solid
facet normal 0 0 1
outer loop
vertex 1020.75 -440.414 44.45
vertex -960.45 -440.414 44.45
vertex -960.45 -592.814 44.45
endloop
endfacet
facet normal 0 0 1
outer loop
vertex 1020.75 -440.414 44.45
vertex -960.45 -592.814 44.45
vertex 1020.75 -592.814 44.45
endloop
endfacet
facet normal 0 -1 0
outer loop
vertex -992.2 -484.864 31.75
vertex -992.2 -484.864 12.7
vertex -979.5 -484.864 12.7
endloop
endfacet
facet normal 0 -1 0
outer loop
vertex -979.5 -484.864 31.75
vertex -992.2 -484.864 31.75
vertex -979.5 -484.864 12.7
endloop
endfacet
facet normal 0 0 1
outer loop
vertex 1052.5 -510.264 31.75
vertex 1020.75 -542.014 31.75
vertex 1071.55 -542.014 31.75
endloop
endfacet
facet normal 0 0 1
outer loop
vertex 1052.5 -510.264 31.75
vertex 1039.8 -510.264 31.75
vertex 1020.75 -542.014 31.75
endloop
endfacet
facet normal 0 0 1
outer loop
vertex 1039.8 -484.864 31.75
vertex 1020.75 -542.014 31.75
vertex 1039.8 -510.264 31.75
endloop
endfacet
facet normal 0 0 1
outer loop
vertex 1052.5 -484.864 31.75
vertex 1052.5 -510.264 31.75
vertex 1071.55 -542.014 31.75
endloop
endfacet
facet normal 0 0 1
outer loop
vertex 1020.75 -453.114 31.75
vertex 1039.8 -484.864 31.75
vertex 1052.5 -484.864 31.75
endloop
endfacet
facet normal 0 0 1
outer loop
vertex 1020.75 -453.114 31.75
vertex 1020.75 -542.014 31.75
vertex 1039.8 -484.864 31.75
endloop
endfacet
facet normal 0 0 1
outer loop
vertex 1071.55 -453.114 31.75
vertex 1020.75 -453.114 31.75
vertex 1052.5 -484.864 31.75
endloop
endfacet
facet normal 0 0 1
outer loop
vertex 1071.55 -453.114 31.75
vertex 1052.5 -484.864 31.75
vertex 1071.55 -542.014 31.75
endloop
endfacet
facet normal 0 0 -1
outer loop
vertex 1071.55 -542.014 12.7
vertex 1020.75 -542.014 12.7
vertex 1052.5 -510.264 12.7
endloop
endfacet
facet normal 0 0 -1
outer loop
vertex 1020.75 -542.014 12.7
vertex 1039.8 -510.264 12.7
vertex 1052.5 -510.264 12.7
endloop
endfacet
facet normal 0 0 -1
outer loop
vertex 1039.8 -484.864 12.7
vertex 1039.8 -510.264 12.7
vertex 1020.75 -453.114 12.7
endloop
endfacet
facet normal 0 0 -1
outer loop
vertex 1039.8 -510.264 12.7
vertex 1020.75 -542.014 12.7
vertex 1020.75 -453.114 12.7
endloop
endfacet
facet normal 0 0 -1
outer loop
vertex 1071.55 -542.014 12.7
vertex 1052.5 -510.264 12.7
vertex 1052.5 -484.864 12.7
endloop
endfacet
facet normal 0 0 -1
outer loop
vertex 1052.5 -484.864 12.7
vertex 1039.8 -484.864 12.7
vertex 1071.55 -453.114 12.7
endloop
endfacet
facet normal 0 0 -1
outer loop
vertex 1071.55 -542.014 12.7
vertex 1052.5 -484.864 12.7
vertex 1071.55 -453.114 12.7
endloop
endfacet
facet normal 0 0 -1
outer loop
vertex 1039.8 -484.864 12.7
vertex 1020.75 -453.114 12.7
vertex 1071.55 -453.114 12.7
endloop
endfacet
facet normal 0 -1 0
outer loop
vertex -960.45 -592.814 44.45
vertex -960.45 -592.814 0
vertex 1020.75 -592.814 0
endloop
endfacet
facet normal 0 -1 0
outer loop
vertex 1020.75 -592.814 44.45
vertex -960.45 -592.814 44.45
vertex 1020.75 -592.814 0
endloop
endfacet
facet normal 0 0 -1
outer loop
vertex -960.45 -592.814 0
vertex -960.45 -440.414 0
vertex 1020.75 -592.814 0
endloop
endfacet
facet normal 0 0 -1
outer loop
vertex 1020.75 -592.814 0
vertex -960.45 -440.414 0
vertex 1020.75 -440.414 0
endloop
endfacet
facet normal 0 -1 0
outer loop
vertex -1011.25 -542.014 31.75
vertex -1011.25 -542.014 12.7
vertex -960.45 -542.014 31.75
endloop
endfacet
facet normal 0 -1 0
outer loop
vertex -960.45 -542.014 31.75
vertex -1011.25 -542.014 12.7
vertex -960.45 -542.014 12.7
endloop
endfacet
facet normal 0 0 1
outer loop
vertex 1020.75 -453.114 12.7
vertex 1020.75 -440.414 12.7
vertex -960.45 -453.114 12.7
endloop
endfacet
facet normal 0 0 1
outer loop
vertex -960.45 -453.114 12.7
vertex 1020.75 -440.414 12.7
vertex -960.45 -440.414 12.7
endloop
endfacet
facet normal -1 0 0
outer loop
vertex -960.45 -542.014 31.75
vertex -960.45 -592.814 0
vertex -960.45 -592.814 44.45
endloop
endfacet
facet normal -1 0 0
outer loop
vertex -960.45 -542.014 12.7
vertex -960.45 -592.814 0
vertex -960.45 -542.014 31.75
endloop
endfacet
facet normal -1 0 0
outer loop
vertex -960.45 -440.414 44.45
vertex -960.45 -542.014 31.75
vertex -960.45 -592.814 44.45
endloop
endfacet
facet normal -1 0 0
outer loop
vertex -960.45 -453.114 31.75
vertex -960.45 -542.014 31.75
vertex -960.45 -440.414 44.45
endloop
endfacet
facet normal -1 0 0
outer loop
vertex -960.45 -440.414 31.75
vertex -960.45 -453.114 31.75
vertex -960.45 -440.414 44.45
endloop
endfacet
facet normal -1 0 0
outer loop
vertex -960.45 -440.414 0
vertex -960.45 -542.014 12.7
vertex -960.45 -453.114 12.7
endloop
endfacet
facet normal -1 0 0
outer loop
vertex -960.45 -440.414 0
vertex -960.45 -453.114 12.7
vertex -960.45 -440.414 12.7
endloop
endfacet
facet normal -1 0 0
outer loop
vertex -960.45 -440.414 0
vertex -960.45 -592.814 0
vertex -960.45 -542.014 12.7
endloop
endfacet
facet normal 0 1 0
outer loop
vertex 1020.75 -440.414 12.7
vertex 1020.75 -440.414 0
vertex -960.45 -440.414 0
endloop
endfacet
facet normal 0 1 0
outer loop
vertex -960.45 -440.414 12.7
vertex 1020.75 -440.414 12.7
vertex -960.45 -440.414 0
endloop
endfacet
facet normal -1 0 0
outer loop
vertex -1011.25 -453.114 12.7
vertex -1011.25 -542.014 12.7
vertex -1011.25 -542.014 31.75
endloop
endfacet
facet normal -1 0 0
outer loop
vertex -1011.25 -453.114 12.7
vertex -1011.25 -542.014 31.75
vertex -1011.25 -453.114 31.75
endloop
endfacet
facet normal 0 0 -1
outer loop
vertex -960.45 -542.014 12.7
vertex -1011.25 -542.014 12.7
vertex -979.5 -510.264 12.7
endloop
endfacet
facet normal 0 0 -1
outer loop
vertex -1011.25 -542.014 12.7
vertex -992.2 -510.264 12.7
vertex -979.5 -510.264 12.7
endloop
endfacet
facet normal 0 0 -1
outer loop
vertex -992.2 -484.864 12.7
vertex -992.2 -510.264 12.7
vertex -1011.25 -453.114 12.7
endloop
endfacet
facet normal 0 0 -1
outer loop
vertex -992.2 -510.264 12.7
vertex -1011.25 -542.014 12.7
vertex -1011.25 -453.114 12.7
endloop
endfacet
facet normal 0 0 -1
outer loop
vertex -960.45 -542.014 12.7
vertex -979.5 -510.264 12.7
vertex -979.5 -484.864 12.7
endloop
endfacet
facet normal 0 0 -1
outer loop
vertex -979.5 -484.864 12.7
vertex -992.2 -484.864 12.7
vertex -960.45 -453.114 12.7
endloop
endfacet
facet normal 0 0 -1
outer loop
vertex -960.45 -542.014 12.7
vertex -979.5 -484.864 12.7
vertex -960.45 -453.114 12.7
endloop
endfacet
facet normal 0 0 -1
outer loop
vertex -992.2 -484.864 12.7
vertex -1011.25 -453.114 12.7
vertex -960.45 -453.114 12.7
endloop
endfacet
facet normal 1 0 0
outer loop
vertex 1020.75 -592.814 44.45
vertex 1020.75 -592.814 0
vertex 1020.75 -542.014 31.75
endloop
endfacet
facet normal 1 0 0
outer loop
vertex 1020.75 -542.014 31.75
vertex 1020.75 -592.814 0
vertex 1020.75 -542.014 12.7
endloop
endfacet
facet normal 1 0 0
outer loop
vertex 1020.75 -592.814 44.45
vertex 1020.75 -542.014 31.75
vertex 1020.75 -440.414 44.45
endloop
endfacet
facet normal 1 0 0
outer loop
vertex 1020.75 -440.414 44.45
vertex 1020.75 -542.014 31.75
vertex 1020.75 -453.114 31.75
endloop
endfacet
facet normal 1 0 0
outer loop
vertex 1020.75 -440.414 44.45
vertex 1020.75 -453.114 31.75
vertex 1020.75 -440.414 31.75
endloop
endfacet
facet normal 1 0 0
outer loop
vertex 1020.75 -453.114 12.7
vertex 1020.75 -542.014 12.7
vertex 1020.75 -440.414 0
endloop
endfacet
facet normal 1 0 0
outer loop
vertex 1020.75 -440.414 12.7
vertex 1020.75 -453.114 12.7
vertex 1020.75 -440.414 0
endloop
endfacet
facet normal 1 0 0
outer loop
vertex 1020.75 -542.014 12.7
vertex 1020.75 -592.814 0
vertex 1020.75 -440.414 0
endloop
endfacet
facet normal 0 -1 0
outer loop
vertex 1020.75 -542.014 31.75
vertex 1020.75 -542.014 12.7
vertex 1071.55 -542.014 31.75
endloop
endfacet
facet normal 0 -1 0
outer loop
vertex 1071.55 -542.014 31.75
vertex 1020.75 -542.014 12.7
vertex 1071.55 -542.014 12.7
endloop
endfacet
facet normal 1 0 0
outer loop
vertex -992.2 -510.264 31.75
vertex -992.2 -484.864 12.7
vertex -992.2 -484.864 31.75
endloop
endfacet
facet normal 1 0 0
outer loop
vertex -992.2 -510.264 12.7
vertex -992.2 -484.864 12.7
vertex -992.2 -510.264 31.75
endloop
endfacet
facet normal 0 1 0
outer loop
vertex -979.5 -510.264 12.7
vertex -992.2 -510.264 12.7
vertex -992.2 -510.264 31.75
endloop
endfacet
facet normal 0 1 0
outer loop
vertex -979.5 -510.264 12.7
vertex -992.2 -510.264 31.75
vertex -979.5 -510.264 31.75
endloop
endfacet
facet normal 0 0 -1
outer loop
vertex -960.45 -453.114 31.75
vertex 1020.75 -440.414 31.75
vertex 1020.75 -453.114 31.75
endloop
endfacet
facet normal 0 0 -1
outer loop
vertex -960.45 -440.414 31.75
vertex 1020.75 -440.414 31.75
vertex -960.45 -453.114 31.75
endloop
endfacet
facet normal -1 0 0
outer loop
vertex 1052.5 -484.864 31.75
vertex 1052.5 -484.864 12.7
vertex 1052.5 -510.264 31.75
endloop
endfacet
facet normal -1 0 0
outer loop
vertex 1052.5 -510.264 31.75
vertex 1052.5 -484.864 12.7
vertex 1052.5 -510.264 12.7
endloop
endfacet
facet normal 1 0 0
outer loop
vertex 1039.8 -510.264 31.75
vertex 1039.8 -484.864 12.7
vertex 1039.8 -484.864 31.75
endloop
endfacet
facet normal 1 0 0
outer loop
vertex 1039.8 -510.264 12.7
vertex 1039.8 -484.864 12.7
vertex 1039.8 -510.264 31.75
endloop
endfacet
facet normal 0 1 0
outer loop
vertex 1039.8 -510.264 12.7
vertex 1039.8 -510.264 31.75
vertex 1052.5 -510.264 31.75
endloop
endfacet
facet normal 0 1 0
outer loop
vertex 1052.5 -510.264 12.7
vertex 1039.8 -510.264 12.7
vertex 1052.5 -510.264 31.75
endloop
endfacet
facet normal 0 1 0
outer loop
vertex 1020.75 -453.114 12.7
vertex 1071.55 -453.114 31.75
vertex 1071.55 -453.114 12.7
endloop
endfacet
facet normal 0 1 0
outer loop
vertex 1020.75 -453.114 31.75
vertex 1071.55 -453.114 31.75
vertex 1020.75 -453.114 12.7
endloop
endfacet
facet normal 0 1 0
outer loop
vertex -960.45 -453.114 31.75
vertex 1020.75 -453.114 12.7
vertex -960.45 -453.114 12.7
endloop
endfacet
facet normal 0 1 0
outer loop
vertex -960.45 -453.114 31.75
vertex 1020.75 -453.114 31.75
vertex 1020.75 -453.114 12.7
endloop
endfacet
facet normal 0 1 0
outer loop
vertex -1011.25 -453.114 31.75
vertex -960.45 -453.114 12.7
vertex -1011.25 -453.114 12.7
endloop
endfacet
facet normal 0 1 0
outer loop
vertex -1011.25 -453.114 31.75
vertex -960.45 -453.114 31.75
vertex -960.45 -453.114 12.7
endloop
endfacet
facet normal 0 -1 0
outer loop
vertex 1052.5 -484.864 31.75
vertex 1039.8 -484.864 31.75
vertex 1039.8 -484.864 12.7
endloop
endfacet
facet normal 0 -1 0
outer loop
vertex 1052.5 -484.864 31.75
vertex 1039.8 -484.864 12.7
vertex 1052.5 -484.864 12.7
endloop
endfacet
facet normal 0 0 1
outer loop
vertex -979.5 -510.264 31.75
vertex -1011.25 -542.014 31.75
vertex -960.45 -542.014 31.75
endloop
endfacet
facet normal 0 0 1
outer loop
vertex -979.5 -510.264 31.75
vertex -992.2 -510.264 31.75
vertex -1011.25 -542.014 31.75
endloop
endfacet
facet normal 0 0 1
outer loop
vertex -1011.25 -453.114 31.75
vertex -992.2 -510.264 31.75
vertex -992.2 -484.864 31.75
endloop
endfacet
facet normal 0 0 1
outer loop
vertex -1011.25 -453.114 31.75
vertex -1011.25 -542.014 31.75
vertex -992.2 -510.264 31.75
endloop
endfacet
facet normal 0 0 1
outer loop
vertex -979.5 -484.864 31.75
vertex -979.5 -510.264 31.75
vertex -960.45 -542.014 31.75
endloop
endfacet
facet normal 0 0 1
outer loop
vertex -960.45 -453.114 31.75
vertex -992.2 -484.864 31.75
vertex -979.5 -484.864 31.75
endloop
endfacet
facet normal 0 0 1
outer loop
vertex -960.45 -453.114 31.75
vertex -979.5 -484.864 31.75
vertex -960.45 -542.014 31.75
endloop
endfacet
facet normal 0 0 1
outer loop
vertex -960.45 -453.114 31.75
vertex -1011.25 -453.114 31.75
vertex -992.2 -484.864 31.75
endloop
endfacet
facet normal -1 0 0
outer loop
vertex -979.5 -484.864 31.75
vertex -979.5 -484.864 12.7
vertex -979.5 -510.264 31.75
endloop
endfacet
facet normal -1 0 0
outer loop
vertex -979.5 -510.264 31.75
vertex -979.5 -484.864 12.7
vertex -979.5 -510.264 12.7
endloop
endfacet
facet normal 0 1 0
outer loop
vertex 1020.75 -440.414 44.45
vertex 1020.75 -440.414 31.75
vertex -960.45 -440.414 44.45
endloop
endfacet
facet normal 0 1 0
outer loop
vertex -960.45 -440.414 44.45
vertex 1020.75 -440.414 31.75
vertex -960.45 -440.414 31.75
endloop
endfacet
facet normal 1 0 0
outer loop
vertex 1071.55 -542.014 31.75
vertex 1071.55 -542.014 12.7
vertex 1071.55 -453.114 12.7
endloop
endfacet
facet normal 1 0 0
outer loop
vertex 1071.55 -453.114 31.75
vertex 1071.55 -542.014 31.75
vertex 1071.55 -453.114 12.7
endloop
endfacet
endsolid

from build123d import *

# Parameters (mm, degrees)
F0_W     = 50.8
F0_H     = 101.6
F1_DEPTH = 44.45
F2_W     = 50.8
F2_H     = 101.6
F3_DEPTH = 12.7
F4_W     = 50.8
F4_H     = 101.6
F5_DEPTH = 12.7
F6_W     = 2082.8
F6_H     = 19.05
F7_DEPTH = 12.7
F8_W     = 12.7
F8_H     = 25.4
F9_DEPTH = 31.751


with BuildPart() as f1:
    # F0 (on Top) → F1 (new body)
    with BuildSketch(Plane.XY):
        Polygon((1020.749743, -440.41436), (-960.450257, -440.41436), (-960.450257, -542.01436), (-960.450257, -592.81436), (1020.749743, -592.81436), (1020.749743, -542.01436), align=None)
        with Locations((-985.850257, -491.21436)):
            Rectangle(F0_W, F0_H)
        with Locations((1046.149743, -491.21436)):
            Rectangle(F0_W, F0_H)
    extrude(amount=F1_DEPTH)

    # F2 (on Top) → F3 (cut)
    with BuildSketch(Plane.XY):
        with Locations((-985.850257, -491.21436)):
            Rectangle(F2_W, F2_H)
        with Locations((1046.149743, -491.21436)):
            Rectangle(F2_W, F2_H)
    extrude(amount=F3_DEPTH, mode=Mode.SUBTRACT)

    # F4 (on face) → F5 (cut)
    with BuildSketch(Plane.XY.offset(44.45)):
        with Locations((1046.149743, -491.21436)):
            Rectangle(F4_W, F4_H)
        with Locations((-985.850257, -491.21436)):
            Rectangle(F4_W, F4_H)
    extrude(amount=-F5_DEPTH, mode=Mode.SUBTRACT)

    # F6 (on face) → F7 (cut)
    with BuildSketch(Plane(origin=(0, -440.41436, 0), x_dir=(-1, 0, 0), z_dir=(0, 1, 0))):
        with Locations((-30.149743, 22.225)):
            Rectangle(F6_W, F6_H)
    extrude(amount=-F7_DEPTH, mode=Mode.SUBTRACT)

    # F8 (on face) → F9 (cut, through all)
    with BuildSketch(Plane(origin=(0, 0, 12.7), x_dir=(1, 0, 0), z_dir=(0, 0, -1))):
        with Locations((-985.850257, 497.56436)):
            Rectangle(F8_W, F8_H)
        with Locations((1046.149743, 497.56436)):
            Rectangle(F8_W, F8_H)
    extrude(amount=-F9_DEPTH, mode=Mode.SUBTRACT)


solid = f1.part
